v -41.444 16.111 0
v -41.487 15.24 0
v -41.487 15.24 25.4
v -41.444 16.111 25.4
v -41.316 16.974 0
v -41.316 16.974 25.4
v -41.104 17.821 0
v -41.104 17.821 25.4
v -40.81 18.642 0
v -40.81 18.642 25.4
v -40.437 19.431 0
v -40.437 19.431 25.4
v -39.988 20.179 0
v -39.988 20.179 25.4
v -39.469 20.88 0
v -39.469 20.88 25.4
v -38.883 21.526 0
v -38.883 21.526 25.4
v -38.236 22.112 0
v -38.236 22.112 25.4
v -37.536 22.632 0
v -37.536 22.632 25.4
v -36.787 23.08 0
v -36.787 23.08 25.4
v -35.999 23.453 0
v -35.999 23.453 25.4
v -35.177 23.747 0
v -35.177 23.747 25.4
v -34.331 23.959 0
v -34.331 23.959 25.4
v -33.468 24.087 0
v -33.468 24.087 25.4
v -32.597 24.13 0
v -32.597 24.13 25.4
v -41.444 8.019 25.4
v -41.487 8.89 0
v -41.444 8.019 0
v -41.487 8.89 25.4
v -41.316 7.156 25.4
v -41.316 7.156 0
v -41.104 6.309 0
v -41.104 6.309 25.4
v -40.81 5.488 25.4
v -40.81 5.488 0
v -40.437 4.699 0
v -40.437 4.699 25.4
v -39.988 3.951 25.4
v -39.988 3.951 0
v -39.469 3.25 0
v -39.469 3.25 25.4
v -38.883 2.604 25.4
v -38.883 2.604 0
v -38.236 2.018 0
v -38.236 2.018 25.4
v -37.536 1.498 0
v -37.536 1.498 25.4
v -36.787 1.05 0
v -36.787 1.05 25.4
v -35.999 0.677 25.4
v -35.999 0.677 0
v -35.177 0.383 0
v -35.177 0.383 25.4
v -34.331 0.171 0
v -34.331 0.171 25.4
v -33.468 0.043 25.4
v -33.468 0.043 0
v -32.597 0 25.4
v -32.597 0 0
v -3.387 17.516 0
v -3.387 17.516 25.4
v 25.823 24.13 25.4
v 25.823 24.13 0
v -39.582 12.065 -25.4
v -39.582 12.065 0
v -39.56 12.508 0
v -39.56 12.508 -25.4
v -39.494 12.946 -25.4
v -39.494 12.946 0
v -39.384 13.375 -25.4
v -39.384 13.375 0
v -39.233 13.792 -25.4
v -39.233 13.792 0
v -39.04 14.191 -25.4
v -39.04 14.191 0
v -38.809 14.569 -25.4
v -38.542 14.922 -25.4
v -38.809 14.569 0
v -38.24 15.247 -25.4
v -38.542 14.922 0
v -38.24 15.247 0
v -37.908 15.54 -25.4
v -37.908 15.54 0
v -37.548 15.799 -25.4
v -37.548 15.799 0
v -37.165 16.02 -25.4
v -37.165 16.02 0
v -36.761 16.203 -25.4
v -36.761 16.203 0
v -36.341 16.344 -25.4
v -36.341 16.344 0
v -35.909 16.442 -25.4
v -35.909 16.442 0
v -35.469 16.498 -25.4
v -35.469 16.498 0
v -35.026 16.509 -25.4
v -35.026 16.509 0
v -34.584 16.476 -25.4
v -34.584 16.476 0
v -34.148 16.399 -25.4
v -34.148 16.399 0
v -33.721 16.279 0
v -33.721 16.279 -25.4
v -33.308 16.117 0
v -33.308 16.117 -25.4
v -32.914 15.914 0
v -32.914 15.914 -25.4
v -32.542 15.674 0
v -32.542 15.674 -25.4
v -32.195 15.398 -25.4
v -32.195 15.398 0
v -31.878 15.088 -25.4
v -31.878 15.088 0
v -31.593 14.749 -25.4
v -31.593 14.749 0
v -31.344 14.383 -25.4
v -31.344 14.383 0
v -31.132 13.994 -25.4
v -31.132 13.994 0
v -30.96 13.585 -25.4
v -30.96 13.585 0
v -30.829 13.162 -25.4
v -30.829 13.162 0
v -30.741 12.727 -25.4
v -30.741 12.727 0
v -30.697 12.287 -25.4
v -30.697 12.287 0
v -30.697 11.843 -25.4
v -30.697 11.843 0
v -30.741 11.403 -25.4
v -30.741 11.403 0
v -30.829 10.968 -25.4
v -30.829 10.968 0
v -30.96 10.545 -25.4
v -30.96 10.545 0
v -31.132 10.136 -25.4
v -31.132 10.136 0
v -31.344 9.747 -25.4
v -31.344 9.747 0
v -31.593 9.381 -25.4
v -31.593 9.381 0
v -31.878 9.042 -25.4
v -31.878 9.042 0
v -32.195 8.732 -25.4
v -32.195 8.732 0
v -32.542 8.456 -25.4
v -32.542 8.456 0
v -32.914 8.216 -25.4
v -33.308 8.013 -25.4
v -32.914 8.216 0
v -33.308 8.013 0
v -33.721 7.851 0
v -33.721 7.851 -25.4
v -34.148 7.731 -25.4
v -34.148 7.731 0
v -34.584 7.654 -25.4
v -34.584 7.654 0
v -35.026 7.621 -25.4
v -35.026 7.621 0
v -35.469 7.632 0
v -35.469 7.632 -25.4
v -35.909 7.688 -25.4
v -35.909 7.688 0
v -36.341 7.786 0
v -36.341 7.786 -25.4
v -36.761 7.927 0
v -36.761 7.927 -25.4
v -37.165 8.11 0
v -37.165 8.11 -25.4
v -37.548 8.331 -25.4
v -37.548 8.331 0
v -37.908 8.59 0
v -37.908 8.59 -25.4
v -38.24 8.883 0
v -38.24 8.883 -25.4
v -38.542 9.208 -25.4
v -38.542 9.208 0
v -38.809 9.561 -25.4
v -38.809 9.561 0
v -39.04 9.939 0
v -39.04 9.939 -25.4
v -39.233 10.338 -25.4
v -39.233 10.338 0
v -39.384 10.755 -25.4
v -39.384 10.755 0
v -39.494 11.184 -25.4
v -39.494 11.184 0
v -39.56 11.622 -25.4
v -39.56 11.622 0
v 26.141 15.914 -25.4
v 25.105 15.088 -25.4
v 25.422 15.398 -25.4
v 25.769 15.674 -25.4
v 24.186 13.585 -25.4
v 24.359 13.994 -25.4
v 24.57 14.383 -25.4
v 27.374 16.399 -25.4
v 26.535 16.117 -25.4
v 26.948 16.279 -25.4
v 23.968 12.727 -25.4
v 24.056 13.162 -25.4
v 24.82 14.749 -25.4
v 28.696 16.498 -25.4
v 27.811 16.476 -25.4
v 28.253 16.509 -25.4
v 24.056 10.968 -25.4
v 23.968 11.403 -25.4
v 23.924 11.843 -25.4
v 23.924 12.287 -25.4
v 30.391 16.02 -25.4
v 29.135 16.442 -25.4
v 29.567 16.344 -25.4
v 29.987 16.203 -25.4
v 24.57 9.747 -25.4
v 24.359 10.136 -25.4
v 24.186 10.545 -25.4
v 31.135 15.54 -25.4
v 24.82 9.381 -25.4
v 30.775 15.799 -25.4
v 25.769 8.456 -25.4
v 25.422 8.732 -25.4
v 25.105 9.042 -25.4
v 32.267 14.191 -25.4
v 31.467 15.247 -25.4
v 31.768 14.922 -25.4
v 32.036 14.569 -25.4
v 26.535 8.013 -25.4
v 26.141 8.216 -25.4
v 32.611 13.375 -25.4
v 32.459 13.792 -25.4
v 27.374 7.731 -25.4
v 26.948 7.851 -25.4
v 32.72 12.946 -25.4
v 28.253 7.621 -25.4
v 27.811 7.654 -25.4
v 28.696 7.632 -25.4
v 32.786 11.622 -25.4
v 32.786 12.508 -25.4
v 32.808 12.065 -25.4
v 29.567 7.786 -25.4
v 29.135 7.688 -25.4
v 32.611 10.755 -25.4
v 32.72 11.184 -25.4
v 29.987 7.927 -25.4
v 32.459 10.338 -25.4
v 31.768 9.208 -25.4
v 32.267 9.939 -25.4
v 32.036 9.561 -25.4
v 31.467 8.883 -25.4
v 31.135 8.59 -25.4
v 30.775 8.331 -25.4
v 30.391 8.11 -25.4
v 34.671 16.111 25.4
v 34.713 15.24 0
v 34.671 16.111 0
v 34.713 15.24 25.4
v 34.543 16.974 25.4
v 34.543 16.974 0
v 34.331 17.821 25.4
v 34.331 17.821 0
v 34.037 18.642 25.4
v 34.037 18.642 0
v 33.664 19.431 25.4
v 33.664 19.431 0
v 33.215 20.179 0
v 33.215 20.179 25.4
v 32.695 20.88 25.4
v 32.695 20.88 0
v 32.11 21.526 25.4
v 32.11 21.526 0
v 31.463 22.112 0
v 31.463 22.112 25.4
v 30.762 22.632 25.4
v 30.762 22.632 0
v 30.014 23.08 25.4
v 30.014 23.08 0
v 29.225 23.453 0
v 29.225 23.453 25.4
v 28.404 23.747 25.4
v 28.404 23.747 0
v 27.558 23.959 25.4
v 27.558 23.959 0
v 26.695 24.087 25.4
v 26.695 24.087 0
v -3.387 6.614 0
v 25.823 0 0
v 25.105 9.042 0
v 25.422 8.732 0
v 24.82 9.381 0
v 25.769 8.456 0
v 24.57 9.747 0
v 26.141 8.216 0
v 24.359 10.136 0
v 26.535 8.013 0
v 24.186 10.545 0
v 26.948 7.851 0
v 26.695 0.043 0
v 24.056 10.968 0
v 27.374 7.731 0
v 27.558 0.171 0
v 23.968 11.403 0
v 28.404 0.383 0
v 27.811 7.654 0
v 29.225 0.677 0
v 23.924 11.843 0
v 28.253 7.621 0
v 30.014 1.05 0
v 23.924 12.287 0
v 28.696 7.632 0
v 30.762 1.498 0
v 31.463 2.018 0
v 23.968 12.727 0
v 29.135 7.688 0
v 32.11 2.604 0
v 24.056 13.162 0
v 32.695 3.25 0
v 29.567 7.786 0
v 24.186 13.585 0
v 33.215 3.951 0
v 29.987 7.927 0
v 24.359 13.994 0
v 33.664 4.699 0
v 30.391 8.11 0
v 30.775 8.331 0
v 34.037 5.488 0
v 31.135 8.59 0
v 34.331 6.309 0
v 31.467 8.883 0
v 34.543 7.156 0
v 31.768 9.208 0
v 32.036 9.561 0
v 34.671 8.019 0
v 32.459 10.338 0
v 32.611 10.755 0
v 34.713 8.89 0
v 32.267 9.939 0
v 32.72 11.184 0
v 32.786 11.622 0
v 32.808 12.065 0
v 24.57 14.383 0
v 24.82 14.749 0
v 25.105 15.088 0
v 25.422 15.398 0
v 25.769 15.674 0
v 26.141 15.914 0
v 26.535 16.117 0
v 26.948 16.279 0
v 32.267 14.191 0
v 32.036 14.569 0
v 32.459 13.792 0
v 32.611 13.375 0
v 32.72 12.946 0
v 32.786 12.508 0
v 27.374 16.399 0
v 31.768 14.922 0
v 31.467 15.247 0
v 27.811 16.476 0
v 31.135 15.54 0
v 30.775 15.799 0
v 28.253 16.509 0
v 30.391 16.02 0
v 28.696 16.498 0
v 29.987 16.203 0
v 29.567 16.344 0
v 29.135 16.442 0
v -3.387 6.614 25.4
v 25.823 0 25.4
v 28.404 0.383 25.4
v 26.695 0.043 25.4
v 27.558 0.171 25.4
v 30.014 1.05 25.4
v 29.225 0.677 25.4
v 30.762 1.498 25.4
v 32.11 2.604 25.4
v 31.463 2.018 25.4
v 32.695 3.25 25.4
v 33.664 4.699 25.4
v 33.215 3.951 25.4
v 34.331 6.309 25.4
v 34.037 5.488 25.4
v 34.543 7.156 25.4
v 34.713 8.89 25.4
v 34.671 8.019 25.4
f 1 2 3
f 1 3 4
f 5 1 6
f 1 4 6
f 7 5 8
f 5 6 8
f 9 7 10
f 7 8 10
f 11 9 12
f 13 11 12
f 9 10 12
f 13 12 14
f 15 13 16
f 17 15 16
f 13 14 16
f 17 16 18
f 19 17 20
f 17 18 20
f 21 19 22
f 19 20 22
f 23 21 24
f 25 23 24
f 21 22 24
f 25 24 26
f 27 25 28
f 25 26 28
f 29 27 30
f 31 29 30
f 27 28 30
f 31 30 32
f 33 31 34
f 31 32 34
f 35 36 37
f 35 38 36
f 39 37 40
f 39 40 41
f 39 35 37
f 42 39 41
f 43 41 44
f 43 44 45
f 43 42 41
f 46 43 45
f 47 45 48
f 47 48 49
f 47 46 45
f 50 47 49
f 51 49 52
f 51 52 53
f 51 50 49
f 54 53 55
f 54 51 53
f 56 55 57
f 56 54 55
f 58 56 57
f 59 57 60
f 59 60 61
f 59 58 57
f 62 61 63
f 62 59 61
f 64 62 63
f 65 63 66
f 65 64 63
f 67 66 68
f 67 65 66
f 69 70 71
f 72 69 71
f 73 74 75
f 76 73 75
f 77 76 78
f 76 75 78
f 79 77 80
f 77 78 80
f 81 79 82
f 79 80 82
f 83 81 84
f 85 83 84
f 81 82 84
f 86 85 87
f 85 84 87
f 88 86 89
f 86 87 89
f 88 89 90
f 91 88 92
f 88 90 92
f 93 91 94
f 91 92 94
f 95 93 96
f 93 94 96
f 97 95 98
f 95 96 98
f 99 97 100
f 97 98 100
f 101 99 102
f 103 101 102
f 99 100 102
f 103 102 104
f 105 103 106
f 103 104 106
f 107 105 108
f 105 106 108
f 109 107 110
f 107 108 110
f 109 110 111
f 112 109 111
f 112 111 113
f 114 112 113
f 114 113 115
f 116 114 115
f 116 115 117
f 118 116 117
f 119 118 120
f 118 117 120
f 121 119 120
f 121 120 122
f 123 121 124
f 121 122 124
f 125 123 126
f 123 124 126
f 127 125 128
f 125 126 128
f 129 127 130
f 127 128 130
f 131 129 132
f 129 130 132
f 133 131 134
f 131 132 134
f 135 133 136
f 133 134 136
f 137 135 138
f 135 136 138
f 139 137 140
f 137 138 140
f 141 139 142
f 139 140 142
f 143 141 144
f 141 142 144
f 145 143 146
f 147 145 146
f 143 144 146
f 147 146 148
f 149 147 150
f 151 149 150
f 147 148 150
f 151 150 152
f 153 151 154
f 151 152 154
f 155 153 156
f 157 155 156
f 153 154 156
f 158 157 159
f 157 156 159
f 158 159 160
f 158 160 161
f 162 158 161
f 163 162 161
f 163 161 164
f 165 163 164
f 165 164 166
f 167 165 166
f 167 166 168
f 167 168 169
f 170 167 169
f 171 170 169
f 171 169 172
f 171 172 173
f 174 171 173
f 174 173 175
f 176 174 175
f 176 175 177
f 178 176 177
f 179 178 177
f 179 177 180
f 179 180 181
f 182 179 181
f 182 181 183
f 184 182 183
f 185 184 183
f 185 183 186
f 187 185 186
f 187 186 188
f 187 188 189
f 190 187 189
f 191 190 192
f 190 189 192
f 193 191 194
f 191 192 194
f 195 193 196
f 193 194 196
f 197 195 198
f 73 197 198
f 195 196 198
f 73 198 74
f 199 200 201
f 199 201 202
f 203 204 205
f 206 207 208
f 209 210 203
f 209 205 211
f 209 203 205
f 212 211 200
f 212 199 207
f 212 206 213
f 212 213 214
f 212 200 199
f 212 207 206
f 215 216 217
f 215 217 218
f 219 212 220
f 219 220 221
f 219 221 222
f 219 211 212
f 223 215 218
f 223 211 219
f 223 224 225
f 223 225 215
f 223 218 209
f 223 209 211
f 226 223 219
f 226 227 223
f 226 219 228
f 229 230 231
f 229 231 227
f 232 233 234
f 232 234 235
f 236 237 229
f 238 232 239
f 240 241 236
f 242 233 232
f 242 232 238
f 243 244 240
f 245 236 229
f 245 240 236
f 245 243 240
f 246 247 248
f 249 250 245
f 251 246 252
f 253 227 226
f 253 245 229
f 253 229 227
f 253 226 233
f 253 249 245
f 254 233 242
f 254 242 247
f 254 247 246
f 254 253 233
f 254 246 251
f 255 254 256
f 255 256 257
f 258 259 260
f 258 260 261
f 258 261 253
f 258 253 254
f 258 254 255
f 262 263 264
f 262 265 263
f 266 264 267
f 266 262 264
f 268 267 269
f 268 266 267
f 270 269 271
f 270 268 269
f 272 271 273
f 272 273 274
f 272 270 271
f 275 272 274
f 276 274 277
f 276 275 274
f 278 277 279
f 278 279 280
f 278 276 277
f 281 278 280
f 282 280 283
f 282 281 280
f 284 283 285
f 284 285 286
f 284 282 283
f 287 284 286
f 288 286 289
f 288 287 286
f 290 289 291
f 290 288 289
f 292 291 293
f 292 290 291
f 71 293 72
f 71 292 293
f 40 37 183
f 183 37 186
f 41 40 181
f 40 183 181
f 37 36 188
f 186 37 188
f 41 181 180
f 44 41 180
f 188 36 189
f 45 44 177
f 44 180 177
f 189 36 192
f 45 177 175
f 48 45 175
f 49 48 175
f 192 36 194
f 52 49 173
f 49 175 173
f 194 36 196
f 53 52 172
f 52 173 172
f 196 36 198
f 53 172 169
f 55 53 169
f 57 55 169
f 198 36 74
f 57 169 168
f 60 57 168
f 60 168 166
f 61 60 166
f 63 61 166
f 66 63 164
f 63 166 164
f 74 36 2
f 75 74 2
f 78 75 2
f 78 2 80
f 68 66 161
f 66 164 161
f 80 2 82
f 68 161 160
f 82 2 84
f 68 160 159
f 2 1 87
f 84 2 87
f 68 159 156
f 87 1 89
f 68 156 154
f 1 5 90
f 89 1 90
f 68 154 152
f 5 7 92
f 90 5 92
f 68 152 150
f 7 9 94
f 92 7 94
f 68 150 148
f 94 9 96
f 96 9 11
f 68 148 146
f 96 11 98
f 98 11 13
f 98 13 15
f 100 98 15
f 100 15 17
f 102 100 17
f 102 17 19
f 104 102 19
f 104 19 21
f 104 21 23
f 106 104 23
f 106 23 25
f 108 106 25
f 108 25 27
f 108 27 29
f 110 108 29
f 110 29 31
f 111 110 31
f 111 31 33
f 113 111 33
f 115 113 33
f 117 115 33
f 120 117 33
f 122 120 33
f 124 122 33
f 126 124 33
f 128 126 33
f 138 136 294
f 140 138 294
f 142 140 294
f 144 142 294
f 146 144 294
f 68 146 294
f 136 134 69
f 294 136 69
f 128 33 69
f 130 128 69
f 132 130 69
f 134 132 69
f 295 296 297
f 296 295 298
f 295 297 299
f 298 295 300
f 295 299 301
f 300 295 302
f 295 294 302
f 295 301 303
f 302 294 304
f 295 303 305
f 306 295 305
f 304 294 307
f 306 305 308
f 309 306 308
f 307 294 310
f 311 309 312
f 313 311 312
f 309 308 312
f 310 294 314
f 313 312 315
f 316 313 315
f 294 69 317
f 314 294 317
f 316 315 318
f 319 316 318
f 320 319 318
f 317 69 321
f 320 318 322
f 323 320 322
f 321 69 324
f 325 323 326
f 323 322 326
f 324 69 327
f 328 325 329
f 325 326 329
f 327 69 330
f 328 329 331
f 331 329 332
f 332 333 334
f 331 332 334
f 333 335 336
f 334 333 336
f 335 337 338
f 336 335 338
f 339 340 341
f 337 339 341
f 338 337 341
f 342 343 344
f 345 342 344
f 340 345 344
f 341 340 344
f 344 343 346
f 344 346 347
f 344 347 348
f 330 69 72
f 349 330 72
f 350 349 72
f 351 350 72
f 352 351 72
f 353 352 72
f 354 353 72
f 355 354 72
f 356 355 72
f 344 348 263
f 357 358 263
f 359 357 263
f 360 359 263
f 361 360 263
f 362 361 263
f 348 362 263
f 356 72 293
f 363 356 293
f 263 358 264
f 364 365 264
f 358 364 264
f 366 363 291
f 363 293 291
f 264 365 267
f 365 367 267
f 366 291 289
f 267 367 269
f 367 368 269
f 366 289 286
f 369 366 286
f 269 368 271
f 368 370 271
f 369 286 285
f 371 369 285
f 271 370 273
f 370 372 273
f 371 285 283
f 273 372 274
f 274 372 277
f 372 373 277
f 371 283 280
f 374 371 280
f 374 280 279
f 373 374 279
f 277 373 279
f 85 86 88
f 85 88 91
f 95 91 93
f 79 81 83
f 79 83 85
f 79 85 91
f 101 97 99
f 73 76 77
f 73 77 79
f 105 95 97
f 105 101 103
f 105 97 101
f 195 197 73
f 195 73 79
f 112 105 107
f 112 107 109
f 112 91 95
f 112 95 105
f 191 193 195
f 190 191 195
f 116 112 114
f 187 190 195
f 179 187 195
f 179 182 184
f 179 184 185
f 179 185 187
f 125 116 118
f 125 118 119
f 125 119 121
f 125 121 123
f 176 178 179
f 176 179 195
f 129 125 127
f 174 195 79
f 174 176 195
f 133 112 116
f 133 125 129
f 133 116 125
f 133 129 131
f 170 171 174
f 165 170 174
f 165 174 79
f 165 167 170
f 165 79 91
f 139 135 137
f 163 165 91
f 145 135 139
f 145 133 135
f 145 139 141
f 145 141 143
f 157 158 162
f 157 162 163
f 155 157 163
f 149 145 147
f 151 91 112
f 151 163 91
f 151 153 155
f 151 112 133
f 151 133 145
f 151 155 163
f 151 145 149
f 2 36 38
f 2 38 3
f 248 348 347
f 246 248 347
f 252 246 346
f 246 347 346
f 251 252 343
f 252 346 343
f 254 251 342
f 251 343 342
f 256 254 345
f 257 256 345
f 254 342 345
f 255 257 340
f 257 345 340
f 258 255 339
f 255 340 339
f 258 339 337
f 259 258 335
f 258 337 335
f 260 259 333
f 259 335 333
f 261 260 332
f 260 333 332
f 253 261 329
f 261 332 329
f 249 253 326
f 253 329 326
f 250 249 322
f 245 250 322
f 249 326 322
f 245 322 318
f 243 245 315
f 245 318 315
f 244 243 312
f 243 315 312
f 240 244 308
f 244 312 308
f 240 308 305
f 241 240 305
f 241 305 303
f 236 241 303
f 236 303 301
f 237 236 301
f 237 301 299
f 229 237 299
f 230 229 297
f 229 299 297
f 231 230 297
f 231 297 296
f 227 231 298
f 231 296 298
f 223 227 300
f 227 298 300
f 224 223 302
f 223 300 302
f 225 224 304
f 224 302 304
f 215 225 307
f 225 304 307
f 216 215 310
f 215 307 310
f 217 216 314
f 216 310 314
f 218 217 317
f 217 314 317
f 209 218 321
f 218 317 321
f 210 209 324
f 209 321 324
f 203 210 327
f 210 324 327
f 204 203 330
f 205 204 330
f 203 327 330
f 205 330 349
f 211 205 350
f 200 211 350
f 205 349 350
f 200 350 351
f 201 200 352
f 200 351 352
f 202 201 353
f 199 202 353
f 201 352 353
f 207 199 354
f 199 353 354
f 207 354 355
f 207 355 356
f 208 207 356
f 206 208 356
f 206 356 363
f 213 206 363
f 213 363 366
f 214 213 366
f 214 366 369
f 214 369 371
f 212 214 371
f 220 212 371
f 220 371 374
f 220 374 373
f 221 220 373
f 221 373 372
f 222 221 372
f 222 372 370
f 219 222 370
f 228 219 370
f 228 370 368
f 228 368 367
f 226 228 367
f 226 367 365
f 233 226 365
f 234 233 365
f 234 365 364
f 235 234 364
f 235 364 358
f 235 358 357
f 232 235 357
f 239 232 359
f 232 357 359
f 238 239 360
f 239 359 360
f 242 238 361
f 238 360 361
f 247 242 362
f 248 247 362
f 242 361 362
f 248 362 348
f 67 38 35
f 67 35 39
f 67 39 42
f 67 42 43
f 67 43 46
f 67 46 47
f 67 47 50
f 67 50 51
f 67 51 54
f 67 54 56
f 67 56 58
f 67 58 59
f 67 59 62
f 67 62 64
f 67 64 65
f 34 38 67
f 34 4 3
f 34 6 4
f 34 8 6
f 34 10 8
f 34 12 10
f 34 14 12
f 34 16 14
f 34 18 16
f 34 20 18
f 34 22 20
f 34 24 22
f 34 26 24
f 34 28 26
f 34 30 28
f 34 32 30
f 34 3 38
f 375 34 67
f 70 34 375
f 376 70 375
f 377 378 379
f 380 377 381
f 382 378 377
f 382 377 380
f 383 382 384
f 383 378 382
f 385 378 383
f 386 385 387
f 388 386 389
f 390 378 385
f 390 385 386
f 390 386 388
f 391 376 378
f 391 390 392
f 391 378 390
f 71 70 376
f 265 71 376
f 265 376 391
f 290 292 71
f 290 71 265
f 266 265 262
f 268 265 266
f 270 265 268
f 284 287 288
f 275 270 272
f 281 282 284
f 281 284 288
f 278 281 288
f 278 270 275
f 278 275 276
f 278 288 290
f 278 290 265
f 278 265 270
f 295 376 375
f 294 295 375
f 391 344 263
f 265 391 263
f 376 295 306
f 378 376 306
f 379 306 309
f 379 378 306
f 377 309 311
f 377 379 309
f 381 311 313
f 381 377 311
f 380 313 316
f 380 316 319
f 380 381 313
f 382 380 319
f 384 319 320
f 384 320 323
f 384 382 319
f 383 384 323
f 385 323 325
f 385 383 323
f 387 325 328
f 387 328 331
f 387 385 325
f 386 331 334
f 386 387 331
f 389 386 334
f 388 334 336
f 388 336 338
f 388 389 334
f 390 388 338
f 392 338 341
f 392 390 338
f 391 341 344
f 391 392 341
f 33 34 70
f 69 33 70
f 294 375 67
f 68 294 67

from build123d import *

# Parameters (mm, degrees)
F0_W     = 76.200001
F0_H     = 24.130002
F1_DEPTH = 25.4
F2_R     = 8.89
F4_DEPTH = 25.4
F5_R     = 4.445
F6_DEPTH = 25.4


with BuildPart() as f1:
    # F0 (on Top) → F1 (new body)
    with BuildSketch(Plane.XY):
        with Locations((-3.386665, 12.065001)):
            Rectangle(F0_W, F0_H)
    extrude(amount=F1_DEPTH)

    # F2
    f2_edges = [f1.edges().sort_by_distance(p)[0] for p in [
        (-41.486666, 24.130002, 12.7),
        (34.713335, 24.130002, 12.7),
        (-41.486666, 0, 12.7),
        (34.713335, 0, 12.7),
    ]]
    fillet(f2_edges, radius=F2_R)

    # F3 (on face) → F4 (cut)
    with BuildSketch(Plane.XY.offset(25.4)):
        Polygon((25.823335, 24.130002), (-32.596666, 24.130002), (-3.386665, 17.516416), align=None)
        Polygon((25.823335, 0), (-3.386665, 6.613586), (-32.596666, 0), align=None)
    extrude(amount=-F4_DEPTH, mode=Mode.SUBTRACT)

    # F5 (on face) → F6 (join)
    with BuildSketch(Plane(origin=(0, 0, 0), x_dir=(1, 0, 0), z_dir=(0, 0, -1))):
        with BuildLine():
            ThreePointArc((-30.691666, -12.065001), (-35.136666, -7.620001), (-39.581666, -12.065001))
            ThreePointArc((-39.581666, -12.065001), (-35.136666, -16.510001), (-30.691666, -12.065001))
        make_face()
        with Locations((28.363335, -12.065001)):
            Circle(F5_R)
    extrude(amount=F6_DEPTH)


solid = f1.part
